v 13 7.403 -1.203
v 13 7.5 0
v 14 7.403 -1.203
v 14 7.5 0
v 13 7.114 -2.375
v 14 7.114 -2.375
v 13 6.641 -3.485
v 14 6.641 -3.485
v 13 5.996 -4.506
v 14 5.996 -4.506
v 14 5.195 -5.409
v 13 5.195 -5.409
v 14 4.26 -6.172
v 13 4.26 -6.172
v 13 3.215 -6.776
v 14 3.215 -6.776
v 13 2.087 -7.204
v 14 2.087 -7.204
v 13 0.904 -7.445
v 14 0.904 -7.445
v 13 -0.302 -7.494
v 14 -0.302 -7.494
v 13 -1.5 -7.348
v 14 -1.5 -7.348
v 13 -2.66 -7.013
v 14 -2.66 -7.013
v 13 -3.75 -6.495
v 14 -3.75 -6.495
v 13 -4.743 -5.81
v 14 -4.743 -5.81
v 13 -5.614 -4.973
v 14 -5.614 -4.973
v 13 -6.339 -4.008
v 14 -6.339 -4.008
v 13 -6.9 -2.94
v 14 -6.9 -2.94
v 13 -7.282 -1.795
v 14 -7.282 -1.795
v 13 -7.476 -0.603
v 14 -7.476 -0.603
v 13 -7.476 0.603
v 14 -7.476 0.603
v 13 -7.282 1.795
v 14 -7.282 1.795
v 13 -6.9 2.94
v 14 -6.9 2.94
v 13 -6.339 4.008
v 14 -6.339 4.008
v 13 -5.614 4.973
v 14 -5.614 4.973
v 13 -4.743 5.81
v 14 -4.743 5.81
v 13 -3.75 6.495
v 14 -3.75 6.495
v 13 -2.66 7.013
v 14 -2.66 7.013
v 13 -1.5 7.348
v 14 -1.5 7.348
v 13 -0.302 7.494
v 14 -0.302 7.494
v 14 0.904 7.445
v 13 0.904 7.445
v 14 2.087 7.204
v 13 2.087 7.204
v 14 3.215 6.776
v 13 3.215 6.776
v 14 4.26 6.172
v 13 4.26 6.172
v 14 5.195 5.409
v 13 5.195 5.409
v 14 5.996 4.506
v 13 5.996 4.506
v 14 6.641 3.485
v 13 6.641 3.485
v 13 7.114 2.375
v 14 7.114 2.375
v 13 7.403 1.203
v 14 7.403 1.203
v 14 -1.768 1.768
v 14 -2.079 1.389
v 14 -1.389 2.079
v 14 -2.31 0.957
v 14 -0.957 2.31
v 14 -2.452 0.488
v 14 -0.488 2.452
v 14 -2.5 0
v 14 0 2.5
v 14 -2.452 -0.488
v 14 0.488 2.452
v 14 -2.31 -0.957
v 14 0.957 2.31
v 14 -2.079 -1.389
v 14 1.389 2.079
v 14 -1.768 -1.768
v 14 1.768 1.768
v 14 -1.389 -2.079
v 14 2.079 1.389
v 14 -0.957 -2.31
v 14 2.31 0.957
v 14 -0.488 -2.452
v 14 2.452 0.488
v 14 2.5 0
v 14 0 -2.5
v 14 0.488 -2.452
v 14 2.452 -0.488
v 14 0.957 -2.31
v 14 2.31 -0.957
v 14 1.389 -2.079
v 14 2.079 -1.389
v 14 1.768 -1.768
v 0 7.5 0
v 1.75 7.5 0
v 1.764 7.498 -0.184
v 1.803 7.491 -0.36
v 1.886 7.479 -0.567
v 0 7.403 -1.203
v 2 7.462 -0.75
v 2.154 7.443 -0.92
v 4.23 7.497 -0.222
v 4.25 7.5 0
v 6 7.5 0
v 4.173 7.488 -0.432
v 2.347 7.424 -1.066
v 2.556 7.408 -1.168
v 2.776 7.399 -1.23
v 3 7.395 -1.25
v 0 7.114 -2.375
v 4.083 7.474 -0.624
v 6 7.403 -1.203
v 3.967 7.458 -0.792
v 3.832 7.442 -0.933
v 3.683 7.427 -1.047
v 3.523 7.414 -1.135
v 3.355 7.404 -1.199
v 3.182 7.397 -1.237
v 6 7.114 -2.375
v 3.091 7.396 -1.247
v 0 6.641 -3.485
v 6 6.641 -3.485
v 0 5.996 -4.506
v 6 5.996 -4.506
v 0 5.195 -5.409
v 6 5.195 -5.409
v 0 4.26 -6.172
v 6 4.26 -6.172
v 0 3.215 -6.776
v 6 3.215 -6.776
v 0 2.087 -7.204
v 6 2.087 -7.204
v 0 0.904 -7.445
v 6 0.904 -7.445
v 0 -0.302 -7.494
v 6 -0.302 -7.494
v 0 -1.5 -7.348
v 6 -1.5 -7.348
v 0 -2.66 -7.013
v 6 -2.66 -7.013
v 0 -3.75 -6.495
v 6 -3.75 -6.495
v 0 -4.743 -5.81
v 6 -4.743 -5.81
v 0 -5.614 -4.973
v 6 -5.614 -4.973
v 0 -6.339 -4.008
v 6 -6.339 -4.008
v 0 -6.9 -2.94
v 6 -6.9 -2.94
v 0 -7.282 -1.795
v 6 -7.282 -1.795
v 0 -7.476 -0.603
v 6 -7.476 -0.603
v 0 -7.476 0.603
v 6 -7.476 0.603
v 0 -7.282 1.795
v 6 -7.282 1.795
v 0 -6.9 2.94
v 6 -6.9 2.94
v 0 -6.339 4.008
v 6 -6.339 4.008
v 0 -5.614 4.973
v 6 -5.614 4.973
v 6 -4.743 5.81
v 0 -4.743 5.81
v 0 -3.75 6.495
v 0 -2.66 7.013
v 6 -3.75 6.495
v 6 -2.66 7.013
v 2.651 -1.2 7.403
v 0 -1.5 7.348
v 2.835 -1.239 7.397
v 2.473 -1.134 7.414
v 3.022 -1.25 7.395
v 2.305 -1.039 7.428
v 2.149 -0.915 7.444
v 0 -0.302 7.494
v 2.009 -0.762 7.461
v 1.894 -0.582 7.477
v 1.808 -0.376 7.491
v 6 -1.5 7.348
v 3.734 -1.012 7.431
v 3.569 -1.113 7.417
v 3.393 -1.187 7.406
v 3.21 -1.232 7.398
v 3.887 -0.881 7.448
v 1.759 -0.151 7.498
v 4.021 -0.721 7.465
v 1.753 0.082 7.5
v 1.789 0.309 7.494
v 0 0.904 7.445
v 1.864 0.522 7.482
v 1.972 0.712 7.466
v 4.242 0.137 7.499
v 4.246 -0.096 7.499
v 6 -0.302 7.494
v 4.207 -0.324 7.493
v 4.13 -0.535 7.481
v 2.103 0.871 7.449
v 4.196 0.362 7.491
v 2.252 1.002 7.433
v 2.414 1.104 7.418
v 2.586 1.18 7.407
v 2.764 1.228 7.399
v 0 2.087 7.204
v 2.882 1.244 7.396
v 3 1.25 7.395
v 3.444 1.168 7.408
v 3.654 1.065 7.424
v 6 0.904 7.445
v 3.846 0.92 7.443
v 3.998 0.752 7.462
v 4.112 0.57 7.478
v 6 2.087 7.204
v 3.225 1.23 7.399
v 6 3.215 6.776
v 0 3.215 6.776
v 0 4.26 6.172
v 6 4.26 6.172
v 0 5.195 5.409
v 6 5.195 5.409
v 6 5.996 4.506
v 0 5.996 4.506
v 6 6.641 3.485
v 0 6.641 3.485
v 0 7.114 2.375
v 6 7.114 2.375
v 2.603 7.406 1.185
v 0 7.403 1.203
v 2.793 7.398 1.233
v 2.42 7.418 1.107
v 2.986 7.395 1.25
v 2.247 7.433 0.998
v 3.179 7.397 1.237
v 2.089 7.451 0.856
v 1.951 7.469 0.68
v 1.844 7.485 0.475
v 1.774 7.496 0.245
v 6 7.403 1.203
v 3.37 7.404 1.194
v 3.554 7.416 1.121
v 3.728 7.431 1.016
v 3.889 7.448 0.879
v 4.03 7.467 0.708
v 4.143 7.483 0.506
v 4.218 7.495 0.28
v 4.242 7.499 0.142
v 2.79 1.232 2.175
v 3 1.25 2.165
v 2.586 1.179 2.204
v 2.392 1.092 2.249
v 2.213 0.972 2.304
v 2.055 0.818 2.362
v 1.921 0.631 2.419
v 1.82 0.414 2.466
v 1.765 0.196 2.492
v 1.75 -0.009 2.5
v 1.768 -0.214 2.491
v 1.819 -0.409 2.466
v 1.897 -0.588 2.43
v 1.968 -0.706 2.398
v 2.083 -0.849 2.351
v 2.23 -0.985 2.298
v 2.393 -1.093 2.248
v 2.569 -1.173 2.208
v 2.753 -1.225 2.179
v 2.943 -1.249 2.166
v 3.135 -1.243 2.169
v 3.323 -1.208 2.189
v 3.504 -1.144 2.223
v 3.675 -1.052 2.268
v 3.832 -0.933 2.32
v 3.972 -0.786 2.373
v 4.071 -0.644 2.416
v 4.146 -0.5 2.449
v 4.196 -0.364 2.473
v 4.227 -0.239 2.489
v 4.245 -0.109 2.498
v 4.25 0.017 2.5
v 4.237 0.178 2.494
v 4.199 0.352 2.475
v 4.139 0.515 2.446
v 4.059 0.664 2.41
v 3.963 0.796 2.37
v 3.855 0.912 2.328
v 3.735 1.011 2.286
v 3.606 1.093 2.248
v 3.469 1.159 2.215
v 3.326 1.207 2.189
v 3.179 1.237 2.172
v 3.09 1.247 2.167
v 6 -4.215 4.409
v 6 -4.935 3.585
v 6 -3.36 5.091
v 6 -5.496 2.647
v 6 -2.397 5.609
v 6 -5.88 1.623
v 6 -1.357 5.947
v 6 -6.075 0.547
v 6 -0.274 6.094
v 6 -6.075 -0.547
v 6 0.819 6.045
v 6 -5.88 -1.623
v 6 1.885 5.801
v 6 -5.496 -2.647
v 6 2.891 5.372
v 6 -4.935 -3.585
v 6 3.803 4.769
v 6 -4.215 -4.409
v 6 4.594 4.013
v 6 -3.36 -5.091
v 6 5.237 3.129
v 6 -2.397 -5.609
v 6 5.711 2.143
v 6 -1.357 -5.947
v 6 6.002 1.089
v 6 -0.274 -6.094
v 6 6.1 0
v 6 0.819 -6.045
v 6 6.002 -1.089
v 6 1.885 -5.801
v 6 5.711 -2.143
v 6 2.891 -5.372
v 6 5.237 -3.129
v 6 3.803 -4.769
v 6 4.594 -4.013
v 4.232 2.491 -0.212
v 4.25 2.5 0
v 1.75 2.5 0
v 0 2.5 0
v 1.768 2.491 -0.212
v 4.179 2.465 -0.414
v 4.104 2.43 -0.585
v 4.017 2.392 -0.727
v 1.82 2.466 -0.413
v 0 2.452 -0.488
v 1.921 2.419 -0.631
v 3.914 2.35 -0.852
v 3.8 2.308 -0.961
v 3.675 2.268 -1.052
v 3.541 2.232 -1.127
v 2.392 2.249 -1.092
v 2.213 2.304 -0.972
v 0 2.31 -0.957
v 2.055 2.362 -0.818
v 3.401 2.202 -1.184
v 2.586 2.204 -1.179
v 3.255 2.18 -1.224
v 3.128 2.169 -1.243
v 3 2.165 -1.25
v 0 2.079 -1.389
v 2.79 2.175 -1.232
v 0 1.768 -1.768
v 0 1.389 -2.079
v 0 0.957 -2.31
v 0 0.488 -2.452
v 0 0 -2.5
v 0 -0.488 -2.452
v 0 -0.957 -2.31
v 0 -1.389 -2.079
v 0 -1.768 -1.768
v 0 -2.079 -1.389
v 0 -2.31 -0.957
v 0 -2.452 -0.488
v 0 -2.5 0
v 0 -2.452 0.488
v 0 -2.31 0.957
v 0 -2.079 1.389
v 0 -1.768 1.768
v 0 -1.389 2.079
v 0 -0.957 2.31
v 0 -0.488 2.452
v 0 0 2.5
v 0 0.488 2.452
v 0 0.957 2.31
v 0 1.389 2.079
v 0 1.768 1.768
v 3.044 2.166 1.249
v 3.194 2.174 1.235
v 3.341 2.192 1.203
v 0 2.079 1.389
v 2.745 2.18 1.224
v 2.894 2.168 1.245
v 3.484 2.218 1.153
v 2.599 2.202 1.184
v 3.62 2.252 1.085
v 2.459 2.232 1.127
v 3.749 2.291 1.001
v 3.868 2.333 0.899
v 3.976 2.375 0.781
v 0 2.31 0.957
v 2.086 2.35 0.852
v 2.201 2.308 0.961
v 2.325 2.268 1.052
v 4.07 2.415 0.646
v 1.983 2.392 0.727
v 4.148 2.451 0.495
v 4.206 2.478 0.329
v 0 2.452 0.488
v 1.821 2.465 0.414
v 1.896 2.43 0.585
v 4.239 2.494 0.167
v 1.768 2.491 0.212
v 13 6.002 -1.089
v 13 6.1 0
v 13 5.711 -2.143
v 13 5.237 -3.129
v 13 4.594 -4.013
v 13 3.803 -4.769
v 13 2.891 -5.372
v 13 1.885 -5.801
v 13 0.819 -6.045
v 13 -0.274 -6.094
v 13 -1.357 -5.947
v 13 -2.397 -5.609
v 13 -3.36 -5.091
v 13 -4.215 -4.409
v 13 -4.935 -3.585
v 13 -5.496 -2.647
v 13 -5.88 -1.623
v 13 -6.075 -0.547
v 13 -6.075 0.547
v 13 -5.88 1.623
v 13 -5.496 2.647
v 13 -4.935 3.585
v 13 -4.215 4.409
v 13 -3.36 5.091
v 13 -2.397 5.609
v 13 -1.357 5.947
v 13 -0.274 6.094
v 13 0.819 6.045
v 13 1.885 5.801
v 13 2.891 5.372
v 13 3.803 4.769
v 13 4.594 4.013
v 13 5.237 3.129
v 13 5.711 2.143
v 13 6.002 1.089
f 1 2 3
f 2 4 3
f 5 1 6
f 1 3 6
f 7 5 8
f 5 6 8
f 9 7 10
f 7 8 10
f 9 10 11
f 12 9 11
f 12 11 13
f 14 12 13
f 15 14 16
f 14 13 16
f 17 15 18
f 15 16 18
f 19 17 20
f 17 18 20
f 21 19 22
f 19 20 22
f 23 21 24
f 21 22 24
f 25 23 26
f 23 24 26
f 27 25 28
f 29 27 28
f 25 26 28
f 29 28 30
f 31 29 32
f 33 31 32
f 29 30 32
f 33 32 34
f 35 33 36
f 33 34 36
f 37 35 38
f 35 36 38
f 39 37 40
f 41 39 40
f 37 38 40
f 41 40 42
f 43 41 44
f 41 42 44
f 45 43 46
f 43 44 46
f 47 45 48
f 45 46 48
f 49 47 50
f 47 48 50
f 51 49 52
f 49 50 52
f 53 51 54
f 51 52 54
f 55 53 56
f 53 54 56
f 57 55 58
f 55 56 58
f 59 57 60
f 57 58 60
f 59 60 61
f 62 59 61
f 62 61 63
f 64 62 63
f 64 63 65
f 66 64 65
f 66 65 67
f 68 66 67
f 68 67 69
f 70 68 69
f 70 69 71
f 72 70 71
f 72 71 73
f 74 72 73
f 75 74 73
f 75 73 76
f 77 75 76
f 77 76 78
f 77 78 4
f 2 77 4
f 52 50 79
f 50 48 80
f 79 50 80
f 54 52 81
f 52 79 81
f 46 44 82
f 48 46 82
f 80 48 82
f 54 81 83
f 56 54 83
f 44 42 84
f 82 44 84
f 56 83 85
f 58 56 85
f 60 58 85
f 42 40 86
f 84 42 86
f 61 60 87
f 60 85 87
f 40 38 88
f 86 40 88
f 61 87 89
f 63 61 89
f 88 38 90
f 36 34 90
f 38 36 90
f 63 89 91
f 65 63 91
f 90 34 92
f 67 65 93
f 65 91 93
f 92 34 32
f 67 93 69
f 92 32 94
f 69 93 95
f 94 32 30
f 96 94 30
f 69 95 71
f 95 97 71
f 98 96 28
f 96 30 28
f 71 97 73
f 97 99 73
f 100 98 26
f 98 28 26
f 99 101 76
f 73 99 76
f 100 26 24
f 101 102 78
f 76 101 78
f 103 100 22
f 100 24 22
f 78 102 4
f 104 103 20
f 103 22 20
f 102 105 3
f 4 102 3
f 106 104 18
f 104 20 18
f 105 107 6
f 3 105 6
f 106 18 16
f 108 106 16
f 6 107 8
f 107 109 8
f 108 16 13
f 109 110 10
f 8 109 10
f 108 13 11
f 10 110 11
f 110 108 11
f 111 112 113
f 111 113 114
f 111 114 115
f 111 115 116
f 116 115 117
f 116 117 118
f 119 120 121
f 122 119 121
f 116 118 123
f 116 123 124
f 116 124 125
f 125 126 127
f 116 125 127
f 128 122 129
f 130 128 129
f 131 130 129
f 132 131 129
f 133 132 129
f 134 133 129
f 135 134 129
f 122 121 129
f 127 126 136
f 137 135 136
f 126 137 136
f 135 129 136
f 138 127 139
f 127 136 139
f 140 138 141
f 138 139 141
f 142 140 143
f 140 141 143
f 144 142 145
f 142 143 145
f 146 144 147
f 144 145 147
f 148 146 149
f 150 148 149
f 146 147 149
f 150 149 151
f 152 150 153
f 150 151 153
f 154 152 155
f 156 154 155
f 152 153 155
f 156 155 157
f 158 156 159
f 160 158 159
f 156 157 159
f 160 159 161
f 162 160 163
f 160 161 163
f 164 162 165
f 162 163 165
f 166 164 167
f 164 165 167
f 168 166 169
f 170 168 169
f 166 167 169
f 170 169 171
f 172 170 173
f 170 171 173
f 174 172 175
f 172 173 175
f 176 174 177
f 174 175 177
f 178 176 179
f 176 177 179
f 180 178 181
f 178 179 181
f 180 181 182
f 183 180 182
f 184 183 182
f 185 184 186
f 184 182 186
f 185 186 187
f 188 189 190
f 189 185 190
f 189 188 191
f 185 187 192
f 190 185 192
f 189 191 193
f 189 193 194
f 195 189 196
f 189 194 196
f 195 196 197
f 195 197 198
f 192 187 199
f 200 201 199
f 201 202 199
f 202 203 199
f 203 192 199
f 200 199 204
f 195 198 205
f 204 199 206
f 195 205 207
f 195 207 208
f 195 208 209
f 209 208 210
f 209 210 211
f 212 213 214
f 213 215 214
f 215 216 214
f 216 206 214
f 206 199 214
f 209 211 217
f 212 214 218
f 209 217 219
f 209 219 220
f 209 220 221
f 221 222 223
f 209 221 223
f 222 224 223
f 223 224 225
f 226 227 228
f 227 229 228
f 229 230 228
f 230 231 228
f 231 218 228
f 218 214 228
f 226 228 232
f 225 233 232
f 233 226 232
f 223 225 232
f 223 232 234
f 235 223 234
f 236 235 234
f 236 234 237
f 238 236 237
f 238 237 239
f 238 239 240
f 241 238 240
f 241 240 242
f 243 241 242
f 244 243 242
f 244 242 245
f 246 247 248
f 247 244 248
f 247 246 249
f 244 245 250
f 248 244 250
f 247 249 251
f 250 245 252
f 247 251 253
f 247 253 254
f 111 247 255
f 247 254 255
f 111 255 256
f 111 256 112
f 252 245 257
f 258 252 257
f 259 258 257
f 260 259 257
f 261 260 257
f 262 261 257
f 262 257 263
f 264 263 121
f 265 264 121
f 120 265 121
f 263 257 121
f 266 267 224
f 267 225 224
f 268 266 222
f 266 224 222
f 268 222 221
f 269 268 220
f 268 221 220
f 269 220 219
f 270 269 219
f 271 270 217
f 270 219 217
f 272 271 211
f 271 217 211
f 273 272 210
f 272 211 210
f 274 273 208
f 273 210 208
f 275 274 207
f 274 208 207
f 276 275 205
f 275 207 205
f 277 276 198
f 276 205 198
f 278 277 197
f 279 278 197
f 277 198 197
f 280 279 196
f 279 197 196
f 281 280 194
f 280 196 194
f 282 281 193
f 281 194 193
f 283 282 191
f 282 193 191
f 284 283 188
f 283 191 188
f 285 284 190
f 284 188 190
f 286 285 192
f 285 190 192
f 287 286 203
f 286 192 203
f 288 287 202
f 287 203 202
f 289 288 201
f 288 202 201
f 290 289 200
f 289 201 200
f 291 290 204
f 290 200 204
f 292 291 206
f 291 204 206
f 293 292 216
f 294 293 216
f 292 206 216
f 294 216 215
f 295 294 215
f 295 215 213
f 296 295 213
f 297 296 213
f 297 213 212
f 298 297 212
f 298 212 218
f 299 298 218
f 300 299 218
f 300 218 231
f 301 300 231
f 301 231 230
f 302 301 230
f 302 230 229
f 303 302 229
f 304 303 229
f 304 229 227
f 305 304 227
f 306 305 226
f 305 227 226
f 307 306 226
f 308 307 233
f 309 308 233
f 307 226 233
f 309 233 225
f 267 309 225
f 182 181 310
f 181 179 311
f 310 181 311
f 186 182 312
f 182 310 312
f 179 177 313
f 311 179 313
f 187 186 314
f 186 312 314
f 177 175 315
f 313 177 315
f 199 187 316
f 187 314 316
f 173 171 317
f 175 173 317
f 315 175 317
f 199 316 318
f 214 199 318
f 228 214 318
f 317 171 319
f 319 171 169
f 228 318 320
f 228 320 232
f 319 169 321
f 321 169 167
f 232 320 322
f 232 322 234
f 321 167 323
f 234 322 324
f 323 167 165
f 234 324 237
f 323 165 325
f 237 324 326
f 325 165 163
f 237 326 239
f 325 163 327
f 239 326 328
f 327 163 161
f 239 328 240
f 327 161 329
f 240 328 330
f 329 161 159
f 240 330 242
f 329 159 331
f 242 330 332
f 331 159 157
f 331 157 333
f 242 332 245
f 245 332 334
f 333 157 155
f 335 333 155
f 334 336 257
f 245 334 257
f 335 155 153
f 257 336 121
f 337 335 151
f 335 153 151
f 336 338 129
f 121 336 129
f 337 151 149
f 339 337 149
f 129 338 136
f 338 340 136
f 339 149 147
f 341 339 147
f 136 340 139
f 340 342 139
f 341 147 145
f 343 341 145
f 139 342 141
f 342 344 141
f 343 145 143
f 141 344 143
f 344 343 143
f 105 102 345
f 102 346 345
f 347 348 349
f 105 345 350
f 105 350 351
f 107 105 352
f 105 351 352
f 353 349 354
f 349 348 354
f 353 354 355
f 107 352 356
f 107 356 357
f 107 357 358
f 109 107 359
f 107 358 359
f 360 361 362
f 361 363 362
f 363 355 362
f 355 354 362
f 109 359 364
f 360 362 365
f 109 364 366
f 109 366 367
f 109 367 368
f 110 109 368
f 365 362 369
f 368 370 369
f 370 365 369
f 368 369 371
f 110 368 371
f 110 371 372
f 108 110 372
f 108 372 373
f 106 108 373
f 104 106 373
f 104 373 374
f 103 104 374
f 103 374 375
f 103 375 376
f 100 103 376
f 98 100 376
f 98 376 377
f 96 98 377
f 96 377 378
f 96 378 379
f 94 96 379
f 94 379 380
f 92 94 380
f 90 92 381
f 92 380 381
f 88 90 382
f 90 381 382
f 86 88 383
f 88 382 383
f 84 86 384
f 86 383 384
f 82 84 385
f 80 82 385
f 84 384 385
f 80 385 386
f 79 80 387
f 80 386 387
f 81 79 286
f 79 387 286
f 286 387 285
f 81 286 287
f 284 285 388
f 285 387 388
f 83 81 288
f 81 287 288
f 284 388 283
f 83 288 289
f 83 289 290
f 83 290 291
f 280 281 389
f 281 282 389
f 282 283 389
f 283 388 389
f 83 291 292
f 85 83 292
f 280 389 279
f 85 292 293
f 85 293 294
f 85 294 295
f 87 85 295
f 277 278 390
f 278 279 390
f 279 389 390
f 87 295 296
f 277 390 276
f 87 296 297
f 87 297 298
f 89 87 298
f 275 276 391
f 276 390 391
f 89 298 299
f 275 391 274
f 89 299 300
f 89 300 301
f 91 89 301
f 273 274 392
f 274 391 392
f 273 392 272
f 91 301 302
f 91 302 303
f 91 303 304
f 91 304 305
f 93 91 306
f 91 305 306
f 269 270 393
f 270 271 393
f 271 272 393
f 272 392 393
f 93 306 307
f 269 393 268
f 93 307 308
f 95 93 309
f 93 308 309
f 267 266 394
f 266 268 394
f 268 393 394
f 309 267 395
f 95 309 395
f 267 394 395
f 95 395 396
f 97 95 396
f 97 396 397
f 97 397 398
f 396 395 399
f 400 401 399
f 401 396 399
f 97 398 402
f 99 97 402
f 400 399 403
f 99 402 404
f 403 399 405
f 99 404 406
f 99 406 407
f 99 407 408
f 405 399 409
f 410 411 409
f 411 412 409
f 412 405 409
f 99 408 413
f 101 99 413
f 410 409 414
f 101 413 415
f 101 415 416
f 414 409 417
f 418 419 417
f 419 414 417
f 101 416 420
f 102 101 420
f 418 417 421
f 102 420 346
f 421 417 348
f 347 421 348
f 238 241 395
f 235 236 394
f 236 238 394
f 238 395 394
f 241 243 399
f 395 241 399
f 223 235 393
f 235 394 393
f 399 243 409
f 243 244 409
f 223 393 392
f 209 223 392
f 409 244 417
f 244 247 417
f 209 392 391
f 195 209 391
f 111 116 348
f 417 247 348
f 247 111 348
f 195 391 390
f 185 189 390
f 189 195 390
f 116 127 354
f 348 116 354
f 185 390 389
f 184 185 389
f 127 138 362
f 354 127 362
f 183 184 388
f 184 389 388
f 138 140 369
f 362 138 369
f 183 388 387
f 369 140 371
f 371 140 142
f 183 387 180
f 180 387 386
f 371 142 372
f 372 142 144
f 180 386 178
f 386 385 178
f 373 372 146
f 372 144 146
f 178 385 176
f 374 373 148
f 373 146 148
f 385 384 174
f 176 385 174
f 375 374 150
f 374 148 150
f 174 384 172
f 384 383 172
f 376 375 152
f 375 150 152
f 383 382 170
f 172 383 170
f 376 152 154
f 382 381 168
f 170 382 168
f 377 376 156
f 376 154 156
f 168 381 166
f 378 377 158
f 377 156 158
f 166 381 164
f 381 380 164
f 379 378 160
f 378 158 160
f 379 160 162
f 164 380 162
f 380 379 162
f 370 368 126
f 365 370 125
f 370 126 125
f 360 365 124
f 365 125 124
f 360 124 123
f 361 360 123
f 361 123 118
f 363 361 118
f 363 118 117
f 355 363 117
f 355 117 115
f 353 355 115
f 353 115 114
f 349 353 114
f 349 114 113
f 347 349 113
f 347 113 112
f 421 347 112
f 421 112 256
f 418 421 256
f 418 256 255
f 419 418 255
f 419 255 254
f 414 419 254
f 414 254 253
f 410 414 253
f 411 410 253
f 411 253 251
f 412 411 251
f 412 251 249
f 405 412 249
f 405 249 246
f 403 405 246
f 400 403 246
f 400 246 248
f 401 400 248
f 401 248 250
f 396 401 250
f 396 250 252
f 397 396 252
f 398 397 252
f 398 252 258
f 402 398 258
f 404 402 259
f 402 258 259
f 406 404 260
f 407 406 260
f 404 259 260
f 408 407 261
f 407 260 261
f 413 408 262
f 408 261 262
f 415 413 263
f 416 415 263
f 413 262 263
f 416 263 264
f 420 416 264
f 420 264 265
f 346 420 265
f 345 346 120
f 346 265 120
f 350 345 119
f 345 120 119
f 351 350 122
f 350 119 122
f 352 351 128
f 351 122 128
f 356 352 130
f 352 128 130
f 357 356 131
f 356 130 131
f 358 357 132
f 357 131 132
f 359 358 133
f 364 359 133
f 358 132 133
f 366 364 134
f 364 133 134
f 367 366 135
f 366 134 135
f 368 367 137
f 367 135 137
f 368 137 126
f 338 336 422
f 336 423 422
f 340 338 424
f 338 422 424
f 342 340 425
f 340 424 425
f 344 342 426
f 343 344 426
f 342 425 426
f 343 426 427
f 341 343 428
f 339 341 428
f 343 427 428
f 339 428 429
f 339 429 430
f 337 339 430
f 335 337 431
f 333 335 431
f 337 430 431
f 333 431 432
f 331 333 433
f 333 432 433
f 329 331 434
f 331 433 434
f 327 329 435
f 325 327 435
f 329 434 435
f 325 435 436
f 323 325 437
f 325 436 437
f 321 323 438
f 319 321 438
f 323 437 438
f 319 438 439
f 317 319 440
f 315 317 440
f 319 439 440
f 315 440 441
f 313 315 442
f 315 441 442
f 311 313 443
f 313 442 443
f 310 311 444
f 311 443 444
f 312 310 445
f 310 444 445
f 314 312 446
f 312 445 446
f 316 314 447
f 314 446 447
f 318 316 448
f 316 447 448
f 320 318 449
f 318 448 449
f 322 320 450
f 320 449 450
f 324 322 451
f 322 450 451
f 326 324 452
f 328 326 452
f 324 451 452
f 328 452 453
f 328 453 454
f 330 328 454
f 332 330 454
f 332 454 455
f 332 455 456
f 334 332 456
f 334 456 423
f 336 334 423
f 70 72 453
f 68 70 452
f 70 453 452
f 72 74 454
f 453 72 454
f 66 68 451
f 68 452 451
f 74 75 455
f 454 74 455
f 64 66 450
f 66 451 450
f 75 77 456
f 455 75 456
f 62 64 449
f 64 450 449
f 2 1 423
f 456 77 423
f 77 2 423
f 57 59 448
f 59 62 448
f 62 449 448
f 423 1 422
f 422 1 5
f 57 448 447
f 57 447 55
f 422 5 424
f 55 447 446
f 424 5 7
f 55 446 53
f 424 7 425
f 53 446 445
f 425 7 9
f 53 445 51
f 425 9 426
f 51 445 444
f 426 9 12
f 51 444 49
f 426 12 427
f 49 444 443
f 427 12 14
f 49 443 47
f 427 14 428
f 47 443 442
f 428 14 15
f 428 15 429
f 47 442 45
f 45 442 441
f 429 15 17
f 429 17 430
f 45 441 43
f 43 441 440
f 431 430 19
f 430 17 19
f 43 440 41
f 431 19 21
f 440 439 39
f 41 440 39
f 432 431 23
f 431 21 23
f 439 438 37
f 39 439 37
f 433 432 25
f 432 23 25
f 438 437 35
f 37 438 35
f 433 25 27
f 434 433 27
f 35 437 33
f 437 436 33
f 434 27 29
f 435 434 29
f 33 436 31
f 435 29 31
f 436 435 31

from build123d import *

# Parameters (mm, degrees)
SKETCH2_W = 1.25
SKETCH2_H = 7.5
SKETCH4_W = 1.25
SKETCH4_H = 7.5


with BuildPart() as part:
    # Sketch1 → Revolve1 (revolve)
    with BuildSketch(Plane.XY):
        Polygon((0, 2.5), (0, 7.5), (6, 7.5), (6, 6.1), (13, 6.1), (13, 7.5), (14, 7.5), (14, 2.5), align=None)
    revolve(axis=Axis((0, 0, 0), (-1, 0, 0)))

    # Sketch2 → M3x0.5 Tapped Hole1 (revolve, cut)
    with BuildSketch(Plane(origin=(3, 0, 0), x_dir=(0, 0, -1), z_dir=(1, 0, 0))):
        with Locations((0.625, 3.75)):
            Rectangle(SKETCH2_W, SKETCH2_H)
    revolve(axis=Axis((3, -6.35, 0), (0, 1, 0)), mode=Mode.SUBTRACT)

    # Sketch4 → M3x0.5 Tapped Hole2 (revolve, cut)
    with BuildSketch(Plane.YZ.offset(3)):
        with Locations((0.625, 3.75)):
            Rectangle(SKETCH4_W, SKETCH4_H)
    revolve(axis=Axis((3, 0, -6.35), (0, 0, 1)), mode=Mode.SUBTRACT)


solid = part.part
